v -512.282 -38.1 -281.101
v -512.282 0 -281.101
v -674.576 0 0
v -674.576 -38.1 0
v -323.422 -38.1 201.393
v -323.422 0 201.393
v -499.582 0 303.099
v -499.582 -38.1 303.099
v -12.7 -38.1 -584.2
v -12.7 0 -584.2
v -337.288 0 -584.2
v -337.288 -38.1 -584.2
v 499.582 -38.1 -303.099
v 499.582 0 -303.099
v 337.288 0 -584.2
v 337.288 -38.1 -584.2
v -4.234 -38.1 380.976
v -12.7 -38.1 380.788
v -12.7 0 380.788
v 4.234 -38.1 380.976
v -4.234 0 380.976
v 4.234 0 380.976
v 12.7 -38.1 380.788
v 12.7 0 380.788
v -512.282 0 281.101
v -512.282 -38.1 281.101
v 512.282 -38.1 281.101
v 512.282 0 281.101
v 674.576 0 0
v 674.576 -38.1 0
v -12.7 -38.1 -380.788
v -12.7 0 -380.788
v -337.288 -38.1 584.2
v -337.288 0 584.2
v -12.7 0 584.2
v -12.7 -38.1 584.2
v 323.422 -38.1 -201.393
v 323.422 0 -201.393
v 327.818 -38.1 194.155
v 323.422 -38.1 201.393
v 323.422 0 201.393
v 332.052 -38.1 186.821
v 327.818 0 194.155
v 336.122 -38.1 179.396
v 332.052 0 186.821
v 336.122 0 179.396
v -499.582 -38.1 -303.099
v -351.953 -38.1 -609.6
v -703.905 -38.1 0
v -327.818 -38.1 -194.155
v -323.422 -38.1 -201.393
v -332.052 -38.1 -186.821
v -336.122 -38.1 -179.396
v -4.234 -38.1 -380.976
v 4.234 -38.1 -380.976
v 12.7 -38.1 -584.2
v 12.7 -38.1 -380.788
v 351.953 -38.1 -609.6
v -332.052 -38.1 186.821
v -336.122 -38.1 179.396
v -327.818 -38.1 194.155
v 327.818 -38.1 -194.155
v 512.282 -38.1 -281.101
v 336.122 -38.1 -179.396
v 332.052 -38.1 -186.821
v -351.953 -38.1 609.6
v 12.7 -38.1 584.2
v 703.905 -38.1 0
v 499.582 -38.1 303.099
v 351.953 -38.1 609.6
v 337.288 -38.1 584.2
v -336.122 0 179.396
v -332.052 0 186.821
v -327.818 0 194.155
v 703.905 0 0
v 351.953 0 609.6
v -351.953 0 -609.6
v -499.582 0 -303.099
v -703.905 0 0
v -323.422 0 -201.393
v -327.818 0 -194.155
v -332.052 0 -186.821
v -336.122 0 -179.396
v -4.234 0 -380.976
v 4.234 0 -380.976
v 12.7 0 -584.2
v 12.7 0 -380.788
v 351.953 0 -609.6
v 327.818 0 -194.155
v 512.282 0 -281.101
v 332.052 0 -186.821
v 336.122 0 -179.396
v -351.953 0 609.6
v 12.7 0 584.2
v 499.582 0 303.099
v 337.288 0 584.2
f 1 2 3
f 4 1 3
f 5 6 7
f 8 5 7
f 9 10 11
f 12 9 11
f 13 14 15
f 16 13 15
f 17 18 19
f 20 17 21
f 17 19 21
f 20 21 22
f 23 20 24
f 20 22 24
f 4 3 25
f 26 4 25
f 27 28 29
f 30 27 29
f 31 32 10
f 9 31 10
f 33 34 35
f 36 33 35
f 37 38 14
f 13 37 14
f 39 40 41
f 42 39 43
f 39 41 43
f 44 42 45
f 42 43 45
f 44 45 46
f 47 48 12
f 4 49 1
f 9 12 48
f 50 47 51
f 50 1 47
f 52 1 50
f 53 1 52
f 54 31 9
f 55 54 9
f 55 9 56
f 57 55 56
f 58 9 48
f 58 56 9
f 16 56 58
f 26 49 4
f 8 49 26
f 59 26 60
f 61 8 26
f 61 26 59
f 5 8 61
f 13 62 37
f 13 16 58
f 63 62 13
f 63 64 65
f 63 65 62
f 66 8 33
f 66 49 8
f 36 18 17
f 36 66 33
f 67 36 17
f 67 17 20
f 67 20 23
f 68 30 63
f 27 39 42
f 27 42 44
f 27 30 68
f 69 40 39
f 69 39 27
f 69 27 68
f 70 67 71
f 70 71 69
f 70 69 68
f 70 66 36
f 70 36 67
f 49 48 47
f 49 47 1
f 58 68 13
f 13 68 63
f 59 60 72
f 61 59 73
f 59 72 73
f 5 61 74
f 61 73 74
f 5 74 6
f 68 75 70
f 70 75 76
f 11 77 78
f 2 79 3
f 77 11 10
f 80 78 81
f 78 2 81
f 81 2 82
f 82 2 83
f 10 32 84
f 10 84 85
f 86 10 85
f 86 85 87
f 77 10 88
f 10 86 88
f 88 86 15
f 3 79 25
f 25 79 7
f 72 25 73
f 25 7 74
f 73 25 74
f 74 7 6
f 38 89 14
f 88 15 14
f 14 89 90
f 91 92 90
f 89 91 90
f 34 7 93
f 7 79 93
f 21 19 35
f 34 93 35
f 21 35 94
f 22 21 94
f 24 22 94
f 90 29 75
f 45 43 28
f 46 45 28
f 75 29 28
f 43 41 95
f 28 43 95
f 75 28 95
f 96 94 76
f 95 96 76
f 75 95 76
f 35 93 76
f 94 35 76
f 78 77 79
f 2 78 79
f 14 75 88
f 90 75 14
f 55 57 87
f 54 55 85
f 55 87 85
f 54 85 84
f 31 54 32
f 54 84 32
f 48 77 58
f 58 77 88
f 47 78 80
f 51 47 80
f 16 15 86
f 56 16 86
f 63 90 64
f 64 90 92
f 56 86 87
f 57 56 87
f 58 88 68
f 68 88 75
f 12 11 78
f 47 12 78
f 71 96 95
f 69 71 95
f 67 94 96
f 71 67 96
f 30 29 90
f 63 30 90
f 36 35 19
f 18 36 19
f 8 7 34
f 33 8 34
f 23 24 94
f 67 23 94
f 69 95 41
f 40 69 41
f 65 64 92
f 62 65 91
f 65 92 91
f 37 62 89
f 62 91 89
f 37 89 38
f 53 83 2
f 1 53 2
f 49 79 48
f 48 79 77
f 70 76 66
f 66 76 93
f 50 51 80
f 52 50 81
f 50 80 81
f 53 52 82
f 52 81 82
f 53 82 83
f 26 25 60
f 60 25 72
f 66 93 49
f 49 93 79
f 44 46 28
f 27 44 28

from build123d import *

# Parameters (mm, degrees)
F1_DEPTH = 38.1


with BuildPart() as f1:
    # F0 (on Front) → F1 (new body)
    with BuildSketch(Plane.XZ):
        Polygon((351.952724098, 609.6), (-351.952724098, 609.6), (-703.905448196, 0), (-351.952724098, -609.6), (351.952724098, -609.6), (703.905448196, 0), align=None)
        Polygon((12.7, 584.2), (337.2880272606, 584.2), (499.5820408909, 303.0985226281), (512.2820408909, 281.1014773719), (674.5760545212, 0), (512.2820408909, -281.1014773719), (499.5820408909, -303.0985226281), (337.2880272606, -584.2), (12.7, -584.2), (-12.7, -584.2), (-337.2880272606, -584.2), (-499.5820408909, -303.0985226281), (-512.2820408909, -281.1014773719), (-674.5760545212, 0), (-512.2820408909, 281.1014773719), (-499.5820408909, 303.0985226281), (-449.9381191901, 389.0843173008), (-337.2880272606, 584.2), (-12.7, 584.2), align=None, mode=Mode.SUBTRACT)
        with BuildLine():
            Line((12.7, 380.7882745043), (12.7, 584.2))
            Line((12.7, 584.2), (-12.7, 584.2))
            Line((-12.7, 584.2), (-12.7, 380.7882745043))
            ThreePointArc((-12.7, 380.7882745043), (0, 381), (12.7, 380.7882745043))
        make_face()
        with BuildLine():
            ThreePointArc((-336.122319184, 179.3956146241), (-329.9556788419, 190.5), (-323.422319184, 201.3926598802))
            Line((-323.422319184, 201.3926598802), (-499.5820408909, 303.0985226281))
            Line((-499.5820408909, 303.0985226281), (-512.2820408909, 281.1014773719))
            Line((-512.2820408909, 281.1014773719), (-336.122319184, 179.3956146241))
        make_face()
        with BuildLine():
            Line((512.2820408909, 281.1014773719), (499.5820408909, 303.0985226281))
            Line((499.5820408909, 303.0985226281), (323.422319184, 201.3926598802))
            ThreePointArc((323.422319184, 201.3926598802), (329.9556788419, 190.5), (336.122319184, 179.3956146241))
            Line((336.122319184, 179.3956146241), (512.2820408909, 281.1014773719))
        make_face()
        with BuildLine():
            Line((499.5820408909, -303.0985226281), (512.2820408909, -281.1014773719))
            Line((512.2820408909, -281.1014773719), (336.122319184, -179.3956146241))
            ThreePointArc((336.122319184, -179.3956146241), (329.9556788419, -190.5), (323.422319184, -201.3926598802))
            Line((323.422319184, -201.3926598802), (499.5820408909, -303.0985226281))
        make_face()
        with BuildLine():
            Line((-12.7, -584.2), (12.7, -584.2))
            Line((12.7, -584.2), (12.7, -380.7882745043))
            ThreePointArc((12.7, -380.7882745043), (0, -381), (-12.7, -380.7882745043))
            Line((-12.7, -380.7882745043), (-12.7, -584.2))
        make_face()
        with BuildLine():
            ThreePointArc((-323.422319184, -201.3926598802), (-329.9556788419, -190.5), (-336.122319184, -179.3956146241))
            Line((-336.122319184, -179.3956146241), (-512.2820408909, -281.1014773719))
            Line((-512.2820408909, -281.1014773719), (-499.5820408909, -303.0985226281))
            Line((-499.5820408909, -303.0985226281), (-323.422319184, -201.3926598802))
        make_face()
    extrude(amount=F1_DEPTH)


solid = f1.part
